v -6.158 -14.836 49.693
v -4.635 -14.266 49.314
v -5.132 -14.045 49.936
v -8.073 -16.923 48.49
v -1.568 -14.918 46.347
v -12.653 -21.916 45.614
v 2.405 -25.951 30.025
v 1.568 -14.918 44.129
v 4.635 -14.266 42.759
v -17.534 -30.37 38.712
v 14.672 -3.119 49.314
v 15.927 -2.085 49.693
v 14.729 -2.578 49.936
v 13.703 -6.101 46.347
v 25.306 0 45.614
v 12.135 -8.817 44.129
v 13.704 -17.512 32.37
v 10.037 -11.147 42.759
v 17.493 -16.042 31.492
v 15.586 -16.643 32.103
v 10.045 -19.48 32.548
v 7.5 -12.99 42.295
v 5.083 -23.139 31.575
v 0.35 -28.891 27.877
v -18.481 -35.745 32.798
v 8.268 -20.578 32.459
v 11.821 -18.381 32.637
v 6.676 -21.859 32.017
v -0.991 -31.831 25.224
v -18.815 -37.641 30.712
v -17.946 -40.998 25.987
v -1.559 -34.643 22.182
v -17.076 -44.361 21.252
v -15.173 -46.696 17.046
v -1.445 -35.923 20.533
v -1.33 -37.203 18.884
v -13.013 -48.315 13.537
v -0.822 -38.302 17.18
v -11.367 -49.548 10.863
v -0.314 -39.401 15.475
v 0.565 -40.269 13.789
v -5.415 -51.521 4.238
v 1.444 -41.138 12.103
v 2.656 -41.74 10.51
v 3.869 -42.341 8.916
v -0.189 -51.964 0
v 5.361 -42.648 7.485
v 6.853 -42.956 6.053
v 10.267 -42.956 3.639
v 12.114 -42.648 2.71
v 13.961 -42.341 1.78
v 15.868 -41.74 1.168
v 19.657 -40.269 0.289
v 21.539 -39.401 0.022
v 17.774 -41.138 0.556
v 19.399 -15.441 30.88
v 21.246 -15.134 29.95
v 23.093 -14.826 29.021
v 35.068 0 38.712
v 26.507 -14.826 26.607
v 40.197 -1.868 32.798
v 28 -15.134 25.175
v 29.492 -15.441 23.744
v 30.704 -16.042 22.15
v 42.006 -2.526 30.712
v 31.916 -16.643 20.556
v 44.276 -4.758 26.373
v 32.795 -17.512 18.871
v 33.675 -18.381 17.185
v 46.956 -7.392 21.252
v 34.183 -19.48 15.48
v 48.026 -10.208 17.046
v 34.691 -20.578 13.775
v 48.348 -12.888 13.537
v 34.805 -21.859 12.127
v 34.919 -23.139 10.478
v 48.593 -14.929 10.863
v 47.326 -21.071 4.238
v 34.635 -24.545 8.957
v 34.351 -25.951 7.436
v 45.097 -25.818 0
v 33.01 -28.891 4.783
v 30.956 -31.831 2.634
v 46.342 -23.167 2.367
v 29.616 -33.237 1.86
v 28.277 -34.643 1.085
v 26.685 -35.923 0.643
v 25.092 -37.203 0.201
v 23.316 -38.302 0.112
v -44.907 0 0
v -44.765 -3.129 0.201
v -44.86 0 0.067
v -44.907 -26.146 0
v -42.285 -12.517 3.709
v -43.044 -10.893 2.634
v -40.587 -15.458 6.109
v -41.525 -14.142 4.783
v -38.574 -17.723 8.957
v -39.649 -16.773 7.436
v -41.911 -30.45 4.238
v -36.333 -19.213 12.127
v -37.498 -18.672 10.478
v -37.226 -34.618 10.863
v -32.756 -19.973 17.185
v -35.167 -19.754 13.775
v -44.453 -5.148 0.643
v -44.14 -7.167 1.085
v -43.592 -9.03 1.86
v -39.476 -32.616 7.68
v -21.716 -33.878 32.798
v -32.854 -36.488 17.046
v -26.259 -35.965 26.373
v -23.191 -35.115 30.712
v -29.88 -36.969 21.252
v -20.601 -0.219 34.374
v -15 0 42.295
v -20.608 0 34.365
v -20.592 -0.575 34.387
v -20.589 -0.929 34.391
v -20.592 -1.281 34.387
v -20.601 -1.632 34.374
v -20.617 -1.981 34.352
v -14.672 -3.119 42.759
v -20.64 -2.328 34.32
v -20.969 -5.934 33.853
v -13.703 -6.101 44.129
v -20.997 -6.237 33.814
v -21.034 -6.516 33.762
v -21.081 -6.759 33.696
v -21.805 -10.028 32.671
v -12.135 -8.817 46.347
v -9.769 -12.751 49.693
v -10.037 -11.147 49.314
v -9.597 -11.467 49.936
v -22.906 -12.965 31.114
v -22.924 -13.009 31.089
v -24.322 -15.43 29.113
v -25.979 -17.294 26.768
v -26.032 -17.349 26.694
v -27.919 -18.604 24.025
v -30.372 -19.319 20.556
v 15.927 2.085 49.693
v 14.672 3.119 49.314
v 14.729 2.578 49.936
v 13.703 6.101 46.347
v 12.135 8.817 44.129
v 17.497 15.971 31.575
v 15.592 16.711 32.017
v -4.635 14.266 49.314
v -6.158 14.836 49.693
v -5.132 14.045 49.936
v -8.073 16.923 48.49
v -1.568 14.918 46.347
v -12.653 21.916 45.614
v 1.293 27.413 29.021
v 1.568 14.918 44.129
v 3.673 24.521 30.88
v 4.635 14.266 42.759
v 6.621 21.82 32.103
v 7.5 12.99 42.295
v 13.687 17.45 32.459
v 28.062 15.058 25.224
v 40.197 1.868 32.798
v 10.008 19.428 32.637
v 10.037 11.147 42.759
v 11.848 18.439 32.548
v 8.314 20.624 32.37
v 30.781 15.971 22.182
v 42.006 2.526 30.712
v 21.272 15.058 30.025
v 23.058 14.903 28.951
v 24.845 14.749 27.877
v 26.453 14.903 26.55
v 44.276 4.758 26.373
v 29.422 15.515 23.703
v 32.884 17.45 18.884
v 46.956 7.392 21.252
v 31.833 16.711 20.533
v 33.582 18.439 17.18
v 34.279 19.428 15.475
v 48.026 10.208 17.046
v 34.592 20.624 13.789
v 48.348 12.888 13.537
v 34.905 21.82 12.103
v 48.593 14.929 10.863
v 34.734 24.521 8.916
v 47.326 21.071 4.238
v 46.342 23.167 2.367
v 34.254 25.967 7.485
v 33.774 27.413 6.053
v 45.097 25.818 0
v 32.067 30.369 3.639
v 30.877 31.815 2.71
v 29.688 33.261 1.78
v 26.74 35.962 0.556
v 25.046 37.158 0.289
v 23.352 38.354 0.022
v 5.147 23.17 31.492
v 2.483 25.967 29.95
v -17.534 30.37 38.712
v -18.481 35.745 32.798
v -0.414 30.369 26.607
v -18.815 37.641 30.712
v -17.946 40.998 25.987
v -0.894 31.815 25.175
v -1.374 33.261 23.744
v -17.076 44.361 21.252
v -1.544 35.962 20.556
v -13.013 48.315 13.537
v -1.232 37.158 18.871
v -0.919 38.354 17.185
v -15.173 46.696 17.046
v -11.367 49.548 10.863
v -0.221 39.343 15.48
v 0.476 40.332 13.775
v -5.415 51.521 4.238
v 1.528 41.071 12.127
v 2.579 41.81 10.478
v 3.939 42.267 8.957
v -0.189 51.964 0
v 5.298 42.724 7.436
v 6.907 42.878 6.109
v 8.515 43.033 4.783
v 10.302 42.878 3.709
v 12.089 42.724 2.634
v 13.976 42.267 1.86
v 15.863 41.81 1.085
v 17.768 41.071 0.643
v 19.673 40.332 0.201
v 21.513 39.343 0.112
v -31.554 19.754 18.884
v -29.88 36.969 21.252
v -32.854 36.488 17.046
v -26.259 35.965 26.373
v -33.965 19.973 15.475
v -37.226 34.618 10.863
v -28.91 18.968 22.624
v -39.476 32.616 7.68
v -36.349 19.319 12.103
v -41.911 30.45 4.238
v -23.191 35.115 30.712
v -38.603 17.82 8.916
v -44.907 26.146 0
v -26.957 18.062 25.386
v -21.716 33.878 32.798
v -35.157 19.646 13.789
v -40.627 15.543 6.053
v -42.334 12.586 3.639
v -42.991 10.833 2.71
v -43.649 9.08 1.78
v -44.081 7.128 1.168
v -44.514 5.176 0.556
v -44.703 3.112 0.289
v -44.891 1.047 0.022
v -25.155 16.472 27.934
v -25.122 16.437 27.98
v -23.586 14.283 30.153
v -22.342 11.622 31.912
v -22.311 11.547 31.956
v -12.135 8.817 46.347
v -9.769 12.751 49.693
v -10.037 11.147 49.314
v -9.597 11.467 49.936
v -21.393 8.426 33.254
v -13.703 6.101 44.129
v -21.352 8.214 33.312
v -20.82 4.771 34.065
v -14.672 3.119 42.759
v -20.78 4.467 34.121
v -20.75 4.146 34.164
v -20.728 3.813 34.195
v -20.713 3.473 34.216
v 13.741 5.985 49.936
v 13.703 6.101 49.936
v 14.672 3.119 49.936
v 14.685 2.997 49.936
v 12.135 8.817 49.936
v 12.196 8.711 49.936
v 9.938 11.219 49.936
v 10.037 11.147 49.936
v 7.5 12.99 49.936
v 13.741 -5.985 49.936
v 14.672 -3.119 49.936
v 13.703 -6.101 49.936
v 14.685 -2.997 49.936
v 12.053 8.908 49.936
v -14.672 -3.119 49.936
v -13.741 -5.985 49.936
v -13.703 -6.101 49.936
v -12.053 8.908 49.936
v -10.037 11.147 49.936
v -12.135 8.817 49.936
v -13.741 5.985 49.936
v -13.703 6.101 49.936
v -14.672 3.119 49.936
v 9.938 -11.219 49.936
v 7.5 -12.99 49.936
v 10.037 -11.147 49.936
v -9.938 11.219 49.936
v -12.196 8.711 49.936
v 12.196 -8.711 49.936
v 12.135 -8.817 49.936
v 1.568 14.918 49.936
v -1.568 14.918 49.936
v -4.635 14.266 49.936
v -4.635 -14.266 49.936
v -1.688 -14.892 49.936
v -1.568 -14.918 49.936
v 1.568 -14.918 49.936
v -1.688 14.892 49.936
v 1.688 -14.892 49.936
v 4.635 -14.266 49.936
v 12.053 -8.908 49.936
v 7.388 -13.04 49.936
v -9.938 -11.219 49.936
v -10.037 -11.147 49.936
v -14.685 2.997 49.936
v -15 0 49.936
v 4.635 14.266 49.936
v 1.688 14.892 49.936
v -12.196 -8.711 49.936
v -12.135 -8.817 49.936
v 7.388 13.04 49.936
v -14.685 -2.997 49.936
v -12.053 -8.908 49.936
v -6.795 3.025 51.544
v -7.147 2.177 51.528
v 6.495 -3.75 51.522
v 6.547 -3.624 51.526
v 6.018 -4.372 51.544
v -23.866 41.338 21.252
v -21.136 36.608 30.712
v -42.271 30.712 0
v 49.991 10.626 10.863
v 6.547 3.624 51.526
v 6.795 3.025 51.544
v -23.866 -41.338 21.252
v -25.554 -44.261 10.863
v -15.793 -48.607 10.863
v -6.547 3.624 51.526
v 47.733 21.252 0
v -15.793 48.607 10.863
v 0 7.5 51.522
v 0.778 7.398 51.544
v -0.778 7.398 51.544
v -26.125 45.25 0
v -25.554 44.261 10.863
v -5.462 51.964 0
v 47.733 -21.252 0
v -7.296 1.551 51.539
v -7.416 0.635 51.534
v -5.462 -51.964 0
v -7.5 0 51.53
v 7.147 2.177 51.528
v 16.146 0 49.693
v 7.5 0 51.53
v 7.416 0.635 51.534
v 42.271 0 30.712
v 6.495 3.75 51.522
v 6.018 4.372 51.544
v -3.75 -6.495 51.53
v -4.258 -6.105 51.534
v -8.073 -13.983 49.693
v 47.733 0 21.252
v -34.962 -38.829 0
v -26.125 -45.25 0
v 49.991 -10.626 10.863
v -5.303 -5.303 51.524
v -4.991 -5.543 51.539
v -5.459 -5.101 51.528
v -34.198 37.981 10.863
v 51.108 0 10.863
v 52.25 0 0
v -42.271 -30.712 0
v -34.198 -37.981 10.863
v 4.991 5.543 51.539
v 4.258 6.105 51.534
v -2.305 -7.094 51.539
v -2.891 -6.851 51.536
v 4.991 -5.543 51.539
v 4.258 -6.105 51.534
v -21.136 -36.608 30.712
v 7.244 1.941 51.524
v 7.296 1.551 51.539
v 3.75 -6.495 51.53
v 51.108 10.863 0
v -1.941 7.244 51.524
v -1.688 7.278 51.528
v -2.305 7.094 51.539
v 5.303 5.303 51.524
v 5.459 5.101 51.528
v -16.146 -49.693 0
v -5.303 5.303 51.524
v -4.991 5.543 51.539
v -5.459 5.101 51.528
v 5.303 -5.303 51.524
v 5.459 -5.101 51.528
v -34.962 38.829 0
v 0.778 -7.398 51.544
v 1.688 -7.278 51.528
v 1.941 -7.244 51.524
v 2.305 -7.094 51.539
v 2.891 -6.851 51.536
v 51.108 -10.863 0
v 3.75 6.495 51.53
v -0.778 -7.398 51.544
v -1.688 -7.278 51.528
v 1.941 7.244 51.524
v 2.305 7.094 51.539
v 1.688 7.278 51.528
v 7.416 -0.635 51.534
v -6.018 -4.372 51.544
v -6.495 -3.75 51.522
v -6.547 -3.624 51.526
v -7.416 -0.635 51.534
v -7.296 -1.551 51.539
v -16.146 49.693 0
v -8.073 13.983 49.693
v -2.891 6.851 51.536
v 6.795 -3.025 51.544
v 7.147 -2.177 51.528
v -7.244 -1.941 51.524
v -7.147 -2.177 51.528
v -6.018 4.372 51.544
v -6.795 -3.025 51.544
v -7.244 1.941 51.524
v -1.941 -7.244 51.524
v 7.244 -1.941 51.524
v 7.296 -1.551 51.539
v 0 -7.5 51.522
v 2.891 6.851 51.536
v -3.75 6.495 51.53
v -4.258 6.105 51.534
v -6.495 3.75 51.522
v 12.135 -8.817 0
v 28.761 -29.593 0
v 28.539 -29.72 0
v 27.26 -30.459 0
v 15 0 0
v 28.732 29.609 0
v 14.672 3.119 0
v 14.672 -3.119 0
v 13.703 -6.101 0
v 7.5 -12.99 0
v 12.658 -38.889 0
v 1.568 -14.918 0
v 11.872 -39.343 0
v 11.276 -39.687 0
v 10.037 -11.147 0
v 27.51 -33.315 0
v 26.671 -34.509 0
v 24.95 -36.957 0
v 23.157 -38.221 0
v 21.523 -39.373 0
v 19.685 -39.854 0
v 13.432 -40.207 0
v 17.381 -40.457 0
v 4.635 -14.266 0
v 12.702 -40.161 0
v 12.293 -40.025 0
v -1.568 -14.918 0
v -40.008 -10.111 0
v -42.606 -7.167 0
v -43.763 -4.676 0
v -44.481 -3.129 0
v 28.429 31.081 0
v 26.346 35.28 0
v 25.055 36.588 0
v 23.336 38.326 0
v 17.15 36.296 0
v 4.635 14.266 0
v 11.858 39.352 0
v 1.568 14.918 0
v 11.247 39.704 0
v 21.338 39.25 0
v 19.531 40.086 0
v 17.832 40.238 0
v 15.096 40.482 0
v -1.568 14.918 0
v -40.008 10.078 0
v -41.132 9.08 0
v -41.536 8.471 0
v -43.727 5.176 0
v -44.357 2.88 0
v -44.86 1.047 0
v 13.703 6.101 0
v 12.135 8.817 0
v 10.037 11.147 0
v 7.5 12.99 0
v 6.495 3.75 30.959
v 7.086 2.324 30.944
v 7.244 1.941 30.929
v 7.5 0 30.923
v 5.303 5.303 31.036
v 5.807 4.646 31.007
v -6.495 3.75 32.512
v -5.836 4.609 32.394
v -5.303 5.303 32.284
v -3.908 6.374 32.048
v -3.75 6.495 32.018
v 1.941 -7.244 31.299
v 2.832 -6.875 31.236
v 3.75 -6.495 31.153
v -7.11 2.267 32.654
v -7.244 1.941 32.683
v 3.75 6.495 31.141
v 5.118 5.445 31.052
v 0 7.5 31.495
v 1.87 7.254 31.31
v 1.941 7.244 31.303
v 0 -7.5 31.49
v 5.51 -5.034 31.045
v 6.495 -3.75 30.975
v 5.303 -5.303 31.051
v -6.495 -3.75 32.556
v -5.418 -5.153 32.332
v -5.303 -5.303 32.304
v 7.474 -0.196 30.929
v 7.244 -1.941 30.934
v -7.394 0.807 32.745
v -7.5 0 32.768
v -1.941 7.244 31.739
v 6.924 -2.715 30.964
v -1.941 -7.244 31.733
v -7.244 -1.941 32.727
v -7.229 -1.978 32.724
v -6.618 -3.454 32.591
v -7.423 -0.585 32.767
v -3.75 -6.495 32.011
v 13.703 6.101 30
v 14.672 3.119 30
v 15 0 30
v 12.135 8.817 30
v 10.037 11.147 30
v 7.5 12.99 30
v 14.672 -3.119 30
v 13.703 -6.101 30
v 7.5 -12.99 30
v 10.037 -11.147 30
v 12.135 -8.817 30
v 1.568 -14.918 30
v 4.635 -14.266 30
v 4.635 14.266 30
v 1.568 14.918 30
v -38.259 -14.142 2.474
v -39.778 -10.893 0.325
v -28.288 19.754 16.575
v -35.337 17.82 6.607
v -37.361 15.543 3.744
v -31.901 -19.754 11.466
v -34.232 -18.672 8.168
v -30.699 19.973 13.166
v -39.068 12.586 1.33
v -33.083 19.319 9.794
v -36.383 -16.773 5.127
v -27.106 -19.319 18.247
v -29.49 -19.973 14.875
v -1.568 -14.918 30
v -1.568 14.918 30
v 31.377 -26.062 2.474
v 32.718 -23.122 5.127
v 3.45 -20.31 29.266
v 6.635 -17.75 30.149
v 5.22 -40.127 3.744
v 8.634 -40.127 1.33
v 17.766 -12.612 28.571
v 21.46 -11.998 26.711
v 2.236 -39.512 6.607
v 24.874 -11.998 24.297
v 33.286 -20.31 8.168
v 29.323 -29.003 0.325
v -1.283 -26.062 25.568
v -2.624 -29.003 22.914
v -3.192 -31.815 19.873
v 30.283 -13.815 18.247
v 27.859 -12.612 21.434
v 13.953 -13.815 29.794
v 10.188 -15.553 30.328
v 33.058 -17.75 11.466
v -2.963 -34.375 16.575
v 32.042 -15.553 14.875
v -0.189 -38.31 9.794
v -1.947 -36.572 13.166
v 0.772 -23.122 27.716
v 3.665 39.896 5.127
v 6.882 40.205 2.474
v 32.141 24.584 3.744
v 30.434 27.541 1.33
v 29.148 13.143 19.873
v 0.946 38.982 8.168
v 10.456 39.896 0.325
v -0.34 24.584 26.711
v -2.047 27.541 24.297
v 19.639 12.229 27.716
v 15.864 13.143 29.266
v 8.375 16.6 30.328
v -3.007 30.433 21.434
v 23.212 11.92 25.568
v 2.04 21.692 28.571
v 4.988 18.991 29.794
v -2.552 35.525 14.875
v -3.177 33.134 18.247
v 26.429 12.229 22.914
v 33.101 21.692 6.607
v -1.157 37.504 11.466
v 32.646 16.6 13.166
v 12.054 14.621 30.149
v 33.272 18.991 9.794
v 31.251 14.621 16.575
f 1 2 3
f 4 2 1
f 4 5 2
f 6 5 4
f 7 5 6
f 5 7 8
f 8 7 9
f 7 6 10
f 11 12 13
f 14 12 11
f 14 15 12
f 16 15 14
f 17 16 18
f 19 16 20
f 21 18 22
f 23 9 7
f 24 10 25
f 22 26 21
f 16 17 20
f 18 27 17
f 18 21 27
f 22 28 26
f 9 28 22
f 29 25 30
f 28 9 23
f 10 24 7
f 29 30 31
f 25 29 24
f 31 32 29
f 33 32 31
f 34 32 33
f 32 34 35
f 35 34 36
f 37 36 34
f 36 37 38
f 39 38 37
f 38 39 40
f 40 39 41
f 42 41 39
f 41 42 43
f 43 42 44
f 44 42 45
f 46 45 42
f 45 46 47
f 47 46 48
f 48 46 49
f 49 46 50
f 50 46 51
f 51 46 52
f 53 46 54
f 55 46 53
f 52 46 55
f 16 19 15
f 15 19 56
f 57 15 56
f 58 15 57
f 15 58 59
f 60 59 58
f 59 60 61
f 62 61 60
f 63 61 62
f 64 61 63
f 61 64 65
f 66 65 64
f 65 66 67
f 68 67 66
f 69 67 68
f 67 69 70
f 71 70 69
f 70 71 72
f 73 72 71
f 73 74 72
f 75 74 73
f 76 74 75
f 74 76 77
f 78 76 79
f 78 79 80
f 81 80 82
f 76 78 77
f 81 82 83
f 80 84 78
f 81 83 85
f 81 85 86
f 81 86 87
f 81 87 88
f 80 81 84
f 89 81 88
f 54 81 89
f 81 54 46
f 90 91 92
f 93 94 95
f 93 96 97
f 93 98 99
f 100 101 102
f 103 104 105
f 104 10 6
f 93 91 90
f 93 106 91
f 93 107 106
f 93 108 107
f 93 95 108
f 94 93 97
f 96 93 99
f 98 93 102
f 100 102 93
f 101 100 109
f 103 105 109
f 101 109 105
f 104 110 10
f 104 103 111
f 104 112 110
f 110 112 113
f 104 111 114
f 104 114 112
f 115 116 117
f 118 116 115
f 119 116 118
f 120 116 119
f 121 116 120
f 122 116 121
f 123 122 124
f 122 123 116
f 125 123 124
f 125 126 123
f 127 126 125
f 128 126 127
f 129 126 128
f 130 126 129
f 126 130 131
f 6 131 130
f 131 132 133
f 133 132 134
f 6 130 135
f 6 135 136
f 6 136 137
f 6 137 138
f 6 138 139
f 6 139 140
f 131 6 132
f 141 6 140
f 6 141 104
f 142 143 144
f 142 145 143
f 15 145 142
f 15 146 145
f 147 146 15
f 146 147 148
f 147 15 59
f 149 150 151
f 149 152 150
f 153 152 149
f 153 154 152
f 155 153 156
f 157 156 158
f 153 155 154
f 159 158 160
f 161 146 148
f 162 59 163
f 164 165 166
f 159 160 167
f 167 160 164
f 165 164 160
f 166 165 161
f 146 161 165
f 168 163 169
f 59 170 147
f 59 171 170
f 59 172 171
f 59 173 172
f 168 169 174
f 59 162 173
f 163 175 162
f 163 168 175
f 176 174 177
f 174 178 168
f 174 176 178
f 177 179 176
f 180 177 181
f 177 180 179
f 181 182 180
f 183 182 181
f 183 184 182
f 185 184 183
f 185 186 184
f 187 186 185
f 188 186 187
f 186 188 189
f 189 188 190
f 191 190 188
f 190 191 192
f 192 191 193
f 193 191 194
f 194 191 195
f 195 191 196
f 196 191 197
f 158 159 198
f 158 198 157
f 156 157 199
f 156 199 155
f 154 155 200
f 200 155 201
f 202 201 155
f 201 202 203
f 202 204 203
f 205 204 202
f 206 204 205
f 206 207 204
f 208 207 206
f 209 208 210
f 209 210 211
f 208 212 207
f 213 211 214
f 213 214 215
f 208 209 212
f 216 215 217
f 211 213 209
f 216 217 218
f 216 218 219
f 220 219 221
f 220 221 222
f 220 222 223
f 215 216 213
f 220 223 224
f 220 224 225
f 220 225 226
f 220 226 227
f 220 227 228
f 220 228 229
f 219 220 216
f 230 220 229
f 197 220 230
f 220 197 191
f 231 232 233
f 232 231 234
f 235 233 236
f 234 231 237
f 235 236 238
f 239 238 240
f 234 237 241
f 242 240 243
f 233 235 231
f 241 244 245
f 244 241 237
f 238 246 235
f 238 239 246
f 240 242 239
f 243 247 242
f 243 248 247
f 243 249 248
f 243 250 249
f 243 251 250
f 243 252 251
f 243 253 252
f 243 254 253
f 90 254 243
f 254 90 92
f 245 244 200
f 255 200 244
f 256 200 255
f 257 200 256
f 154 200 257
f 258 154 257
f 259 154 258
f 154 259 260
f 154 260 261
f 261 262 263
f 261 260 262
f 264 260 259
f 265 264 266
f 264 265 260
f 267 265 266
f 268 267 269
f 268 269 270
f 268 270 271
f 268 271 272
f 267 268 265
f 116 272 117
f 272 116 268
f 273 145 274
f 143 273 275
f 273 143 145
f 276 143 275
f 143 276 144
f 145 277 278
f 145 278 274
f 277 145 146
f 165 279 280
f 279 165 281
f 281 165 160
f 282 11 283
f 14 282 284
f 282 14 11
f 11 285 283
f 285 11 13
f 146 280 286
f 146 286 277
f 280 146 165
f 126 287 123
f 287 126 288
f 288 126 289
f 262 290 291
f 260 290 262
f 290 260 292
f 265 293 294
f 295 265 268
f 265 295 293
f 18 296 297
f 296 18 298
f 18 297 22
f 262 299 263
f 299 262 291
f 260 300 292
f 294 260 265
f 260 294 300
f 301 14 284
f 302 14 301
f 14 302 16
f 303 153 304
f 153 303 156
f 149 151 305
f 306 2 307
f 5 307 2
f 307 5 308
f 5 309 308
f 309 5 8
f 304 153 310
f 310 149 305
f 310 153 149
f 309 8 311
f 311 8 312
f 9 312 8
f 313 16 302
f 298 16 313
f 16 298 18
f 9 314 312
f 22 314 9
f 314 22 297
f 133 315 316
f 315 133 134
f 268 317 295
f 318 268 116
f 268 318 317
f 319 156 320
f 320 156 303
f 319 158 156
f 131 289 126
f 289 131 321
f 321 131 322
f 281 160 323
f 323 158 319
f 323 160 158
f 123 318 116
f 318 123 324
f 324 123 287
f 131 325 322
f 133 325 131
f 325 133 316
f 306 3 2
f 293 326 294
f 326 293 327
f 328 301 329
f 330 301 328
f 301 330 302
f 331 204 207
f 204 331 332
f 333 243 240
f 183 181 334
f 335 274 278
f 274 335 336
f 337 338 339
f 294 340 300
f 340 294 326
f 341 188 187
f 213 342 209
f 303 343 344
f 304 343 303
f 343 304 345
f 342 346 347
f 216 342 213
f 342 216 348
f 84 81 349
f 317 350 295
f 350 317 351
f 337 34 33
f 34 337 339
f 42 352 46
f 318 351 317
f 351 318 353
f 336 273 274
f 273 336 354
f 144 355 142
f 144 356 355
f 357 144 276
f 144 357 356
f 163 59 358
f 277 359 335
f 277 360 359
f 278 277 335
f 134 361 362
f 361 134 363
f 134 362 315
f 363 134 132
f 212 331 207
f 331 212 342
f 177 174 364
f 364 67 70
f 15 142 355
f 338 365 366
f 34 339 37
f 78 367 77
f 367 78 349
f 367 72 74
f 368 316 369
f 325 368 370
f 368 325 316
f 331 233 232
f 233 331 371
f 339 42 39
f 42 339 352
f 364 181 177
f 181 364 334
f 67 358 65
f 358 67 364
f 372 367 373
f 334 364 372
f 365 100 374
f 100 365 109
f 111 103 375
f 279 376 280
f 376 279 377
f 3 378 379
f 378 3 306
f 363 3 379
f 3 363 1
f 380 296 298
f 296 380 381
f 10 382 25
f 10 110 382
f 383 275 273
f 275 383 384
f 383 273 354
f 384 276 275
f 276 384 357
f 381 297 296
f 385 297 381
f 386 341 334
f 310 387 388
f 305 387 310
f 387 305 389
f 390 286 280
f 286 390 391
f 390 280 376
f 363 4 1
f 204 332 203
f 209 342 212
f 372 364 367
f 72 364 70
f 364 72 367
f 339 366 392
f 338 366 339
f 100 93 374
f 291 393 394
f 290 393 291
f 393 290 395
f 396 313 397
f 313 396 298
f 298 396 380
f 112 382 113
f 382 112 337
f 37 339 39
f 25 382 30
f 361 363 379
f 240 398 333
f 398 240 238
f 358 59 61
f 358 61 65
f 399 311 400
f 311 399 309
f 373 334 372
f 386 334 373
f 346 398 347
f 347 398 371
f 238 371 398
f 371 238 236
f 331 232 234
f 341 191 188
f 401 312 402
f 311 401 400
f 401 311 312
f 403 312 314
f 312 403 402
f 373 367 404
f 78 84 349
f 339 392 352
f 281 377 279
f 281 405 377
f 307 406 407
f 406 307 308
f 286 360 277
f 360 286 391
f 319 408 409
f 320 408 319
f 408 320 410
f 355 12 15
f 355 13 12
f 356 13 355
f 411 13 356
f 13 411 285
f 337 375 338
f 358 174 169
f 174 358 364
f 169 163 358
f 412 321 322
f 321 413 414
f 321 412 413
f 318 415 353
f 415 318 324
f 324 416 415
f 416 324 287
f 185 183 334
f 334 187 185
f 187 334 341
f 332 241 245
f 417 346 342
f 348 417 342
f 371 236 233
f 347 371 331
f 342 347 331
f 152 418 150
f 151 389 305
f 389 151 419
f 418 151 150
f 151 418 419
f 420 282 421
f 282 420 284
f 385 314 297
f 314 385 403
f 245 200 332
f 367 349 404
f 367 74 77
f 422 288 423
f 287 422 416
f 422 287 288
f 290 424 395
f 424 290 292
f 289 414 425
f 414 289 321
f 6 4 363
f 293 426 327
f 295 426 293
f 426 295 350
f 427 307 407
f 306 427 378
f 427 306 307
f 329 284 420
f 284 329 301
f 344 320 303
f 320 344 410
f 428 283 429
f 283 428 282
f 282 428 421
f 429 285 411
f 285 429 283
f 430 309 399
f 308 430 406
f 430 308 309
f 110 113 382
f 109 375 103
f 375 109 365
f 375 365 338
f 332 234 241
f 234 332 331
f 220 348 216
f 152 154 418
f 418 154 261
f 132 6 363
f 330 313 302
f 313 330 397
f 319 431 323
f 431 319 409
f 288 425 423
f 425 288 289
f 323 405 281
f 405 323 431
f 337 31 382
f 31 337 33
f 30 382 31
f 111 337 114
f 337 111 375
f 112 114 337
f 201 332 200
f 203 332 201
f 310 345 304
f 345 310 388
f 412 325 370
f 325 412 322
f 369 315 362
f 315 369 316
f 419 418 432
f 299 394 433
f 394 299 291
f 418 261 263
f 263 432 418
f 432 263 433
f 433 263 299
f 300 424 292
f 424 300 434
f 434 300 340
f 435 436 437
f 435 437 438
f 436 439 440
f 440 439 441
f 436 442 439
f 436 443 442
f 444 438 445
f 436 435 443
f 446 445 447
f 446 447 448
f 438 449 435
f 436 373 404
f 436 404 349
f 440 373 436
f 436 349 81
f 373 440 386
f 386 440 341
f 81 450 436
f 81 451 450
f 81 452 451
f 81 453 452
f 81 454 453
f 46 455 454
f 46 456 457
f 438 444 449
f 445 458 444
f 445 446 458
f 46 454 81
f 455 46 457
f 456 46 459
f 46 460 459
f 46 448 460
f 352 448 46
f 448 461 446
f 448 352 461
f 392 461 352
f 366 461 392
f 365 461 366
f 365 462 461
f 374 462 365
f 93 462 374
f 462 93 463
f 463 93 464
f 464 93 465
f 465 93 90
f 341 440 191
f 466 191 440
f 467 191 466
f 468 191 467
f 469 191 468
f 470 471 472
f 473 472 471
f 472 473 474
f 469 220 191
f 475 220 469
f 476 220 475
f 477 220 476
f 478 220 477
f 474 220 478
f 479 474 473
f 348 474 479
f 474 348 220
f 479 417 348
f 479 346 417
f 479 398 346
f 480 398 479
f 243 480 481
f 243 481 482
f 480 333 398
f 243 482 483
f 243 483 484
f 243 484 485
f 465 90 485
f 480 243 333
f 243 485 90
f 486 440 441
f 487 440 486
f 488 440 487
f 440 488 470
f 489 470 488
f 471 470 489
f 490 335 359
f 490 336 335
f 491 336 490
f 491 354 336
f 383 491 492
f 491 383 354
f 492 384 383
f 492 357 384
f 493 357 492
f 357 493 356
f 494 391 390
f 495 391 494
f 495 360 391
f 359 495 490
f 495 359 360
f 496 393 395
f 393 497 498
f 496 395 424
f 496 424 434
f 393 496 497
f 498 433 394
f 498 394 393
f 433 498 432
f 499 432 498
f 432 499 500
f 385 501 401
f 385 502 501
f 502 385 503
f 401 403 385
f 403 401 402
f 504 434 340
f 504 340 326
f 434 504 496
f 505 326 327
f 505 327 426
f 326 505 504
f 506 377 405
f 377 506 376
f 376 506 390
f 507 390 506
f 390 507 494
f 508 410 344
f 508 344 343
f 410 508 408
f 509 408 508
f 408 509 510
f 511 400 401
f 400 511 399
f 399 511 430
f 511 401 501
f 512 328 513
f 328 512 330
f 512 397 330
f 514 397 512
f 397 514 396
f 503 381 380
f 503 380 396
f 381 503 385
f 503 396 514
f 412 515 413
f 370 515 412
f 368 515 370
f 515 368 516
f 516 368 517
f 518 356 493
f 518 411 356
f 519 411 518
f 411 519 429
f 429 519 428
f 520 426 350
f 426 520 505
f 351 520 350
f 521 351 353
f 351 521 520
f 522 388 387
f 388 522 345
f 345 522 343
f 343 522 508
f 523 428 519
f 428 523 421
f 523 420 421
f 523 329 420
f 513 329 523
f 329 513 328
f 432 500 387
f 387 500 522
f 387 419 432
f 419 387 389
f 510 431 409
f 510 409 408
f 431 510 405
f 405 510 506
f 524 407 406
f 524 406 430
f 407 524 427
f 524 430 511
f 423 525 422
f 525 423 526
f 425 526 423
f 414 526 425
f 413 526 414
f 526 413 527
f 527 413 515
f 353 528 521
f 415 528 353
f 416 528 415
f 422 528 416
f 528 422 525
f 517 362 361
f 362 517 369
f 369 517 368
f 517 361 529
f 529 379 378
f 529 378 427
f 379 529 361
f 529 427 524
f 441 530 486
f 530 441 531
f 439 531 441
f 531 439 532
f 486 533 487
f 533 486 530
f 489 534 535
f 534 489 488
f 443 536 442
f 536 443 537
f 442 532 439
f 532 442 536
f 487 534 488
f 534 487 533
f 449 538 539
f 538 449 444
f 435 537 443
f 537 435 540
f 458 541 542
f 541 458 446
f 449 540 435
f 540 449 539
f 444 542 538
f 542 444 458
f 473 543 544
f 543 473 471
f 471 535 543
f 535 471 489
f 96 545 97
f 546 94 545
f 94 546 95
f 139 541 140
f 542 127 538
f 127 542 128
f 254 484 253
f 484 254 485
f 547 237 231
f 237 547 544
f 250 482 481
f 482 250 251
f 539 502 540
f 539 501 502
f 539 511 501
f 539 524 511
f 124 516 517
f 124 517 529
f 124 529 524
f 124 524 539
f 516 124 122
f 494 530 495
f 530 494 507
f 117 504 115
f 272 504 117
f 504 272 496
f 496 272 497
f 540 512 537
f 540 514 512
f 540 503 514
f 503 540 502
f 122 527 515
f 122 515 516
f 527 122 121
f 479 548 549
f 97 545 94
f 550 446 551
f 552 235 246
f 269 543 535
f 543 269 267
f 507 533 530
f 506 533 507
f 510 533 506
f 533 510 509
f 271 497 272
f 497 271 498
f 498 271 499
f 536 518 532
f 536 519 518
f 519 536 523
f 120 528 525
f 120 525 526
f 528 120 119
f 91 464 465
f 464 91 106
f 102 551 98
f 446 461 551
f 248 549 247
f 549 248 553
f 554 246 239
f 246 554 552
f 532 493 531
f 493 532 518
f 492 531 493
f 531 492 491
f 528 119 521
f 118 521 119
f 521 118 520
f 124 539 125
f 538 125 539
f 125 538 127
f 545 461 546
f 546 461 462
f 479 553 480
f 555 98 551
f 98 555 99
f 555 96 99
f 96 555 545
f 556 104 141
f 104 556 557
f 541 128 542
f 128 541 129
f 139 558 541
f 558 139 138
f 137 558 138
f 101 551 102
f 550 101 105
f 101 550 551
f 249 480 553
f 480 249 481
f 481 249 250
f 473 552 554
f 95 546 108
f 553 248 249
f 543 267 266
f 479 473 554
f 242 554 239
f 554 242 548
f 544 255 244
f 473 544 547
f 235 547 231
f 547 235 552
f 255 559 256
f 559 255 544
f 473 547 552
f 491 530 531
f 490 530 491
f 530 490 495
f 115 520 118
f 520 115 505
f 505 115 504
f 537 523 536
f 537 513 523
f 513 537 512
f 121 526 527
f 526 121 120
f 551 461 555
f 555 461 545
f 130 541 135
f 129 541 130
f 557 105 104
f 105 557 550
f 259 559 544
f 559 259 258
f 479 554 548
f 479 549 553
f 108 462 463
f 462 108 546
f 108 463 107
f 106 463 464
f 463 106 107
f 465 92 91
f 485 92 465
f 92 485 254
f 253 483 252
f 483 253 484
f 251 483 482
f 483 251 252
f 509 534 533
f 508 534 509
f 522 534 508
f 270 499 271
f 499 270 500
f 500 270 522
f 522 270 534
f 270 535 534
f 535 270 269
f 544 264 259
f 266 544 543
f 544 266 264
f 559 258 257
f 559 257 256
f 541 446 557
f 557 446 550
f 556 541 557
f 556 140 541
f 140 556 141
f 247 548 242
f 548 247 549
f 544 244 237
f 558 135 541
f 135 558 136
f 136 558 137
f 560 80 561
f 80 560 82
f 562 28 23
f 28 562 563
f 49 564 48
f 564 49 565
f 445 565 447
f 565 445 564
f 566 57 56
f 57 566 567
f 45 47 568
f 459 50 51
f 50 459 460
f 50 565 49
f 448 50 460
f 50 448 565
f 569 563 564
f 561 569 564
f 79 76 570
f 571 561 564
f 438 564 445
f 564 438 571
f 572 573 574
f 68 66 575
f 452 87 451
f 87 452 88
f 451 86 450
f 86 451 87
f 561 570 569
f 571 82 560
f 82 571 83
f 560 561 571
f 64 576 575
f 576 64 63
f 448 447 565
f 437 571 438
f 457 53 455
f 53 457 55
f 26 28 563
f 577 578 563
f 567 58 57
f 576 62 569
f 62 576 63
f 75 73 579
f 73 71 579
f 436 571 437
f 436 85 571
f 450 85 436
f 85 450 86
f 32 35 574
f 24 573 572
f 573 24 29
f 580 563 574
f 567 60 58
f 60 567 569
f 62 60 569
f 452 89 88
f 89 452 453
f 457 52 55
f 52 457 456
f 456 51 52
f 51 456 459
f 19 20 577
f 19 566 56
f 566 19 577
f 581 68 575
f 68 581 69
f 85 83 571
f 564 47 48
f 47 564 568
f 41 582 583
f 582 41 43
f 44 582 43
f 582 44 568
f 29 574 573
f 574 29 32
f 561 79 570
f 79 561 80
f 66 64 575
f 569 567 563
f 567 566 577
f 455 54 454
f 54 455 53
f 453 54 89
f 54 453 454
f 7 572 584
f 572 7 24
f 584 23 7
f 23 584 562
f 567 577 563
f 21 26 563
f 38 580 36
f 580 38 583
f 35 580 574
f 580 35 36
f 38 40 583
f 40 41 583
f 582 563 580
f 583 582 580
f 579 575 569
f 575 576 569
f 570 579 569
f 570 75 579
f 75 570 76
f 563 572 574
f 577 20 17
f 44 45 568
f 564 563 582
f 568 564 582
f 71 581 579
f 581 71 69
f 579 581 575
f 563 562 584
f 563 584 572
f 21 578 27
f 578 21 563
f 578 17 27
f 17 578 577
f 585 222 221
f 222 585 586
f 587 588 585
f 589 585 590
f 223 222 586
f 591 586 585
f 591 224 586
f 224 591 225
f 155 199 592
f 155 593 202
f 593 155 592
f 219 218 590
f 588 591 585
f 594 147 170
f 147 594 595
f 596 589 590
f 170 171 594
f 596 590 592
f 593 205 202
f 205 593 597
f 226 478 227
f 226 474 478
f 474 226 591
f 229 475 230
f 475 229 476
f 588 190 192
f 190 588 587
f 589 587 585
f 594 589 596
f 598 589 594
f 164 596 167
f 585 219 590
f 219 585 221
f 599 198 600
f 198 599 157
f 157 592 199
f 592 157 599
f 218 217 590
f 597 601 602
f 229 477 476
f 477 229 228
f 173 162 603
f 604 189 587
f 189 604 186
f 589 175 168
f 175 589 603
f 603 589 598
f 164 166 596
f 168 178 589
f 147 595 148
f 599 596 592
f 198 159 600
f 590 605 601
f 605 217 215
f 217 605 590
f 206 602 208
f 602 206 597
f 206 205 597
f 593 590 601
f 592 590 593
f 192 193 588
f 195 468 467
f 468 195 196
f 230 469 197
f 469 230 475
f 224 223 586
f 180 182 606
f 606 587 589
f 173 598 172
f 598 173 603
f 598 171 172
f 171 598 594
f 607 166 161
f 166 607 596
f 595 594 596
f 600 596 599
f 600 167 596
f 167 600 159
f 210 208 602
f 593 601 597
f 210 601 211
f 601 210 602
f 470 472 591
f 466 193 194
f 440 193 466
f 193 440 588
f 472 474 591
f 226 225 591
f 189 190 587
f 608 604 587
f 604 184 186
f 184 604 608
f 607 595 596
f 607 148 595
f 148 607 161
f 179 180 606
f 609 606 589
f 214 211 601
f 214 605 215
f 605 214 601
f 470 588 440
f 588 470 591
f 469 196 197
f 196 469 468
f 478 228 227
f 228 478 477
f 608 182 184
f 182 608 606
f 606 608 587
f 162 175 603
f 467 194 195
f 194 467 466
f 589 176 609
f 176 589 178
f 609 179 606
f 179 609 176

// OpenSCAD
HEIGHT = 60;
FAN_DIA = 40;

HOTEND_TOP_DIA = 15;
HOTEND_TOP_HEIGHT = 13;
HOTEND_BOT_DIA = 30;
HOTEND_BOT_HEIGHT = 30;


module hotend_channel() {
  cylinder(h = HOTEND_BOT_HEIGHT, d = HOTEND_BOT_DIA);
}


module hotend() {
  union() {
    translate([0, 0, HOTEND_BOT_HEIGHT-10])
        cylinder(h = HOTEND_TOP_HEIGHT+20, d = HOTEND_TOP_DIA);

    hotend_channel();

    translate([0, 0, -10])
        hotend_channel();
  }
}

module long_cylinder(h, d, l, center) {
  hull() {
    translate([-l/2, 0, 0])
        cylinder(h = h, d = d, center = center);

    translate([l/2, 0, 0])
        cylinder(h = h, d = d, center = center);
  }
}

module fan_hole(side, height, depth) {
  side_delta = sqrt(2) * (height + FAN_DIA/2);
  dist = (side - side_delta) * sqrt(6)/6;
  h = (height + FAN_DIA/2) * sqrt(6)/3;

  translate([-dist, 0, h])
      rotate([45, atan(1/sqrt(2)), -120])
      cylinder(h = depth*2, d = FAN_DIA, center = true);
}

module body(side) {
  limit = side * 0.95;

  intersection() {
    union() {
      translate([0, 0, -side * sqrt(3)/6])
          rotate([45, atan(1/sqrt(2)), 0])
          cube([side, side, side], center=true);

      cylinder(h = side*sqrt(3)/3, d = HOTEND_TOP_DIA * 2);
    }
    intersection() {
      sphere(d = limit);
      cylinder(h = HEIGHT, d = limit);
    }
  }
}

module cooler() {
  margin = 15;
  side = 2 * FAN_DIA + 2 * margin;
  fan_hole_depth = 4;
  fan_hole_height = 0;

  difference() {
    difference() {
      body(side);

      hotend();
    }

    hull() {
      fan_hole(side, fan_hole_height, fan_hole_depth);
      hotend_channel();
    }

    rotate([0, 0, 120])
        fan_hole(side, fan_hole_height, fan_hole_depth);

    rotate([0, 0, 240])
        fan_hole(side, fan_hole_height, fan_hole_depth);

  }
}

cooler();
